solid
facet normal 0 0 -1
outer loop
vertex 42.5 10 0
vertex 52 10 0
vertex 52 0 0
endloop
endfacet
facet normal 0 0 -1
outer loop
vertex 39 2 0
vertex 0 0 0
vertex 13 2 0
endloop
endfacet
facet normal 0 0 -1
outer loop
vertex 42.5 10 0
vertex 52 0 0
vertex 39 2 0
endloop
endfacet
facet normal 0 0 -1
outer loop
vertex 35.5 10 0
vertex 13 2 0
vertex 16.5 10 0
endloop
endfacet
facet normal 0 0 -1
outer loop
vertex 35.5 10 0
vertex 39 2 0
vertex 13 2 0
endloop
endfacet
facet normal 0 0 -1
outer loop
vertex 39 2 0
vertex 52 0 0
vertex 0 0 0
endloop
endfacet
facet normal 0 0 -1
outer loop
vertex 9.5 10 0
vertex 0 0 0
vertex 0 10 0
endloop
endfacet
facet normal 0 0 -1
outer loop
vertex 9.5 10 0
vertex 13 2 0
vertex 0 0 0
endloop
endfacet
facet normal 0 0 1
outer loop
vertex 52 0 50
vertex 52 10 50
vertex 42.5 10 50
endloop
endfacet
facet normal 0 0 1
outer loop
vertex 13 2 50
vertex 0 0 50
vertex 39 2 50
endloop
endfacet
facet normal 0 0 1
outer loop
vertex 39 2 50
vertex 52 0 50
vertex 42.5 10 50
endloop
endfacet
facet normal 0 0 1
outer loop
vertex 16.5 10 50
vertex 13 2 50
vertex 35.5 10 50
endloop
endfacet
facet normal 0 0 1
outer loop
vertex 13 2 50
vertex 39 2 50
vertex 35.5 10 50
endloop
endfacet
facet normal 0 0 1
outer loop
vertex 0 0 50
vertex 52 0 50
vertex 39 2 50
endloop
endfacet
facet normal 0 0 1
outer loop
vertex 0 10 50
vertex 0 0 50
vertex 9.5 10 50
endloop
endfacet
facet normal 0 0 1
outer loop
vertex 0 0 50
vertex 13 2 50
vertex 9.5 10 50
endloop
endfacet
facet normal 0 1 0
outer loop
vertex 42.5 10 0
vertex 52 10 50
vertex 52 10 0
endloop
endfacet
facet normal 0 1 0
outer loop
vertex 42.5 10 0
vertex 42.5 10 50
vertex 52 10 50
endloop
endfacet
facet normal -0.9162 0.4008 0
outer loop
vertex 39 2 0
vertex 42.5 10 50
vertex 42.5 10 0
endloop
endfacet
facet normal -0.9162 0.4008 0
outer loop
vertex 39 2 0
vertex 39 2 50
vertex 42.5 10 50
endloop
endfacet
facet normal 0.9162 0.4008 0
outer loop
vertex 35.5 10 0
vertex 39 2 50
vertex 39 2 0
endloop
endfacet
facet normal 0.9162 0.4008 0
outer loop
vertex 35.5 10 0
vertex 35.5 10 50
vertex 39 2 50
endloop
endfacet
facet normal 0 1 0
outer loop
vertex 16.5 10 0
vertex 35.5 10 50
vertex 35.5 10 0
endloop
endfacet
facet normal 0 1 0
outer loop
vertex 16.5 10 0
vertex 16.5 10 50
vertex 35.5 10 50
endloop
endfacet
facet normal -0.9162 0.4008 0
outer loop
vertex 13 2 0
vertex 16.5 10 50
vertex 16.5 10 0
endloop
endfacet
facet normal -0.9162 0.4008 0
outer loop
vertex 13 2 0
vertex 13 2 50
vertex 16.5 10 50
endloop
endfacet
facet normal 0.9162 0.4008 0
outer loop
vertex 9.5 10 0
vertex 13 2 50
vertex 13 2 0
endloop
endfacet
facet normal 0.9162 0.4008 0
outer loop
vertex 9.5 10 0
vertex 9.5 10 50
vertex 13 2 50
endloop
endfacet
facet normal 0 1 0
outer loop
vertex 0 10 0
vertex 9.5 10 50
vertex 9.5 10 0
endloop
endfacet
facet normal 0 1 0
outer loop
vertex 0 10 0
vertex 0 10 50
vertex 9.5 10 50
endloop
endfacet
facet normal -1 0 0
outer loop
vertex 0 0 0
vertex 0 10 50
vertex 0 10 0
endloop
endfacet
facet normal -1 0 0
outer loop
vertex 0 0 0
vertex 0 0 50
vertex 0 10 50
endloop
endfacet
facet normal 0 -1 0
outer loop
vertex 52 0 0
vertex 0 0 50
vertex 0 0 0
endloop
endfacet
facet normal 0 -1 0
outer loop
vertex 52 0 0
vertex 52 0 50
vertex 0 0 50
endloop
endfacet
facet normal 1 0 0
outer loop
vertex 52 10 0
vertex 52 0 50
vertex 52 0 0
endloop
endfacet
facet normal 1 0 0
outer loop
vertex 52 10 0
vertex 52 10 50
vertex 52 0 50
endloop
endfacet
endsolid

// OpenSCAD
$fn = 32;

// ----------------------------------------------------------------------
// V guide rail: doublev, 52 mm wide
// ----------------------------------------------------------------------

// --- parameters (mm) ---
rail_w = 52;              // rail width, X
base_t = 10;              // base plate thickness
v_depth = 8;              // V feature depth / height
v_half_w = 7;             // half width of the V at the base face
plate_t = 50;             // rail length, Z (the extrusion height)
groove_off = 13;          // offset of each groove from the centreline
fit_tol = 0.1;            // declared fit tolerance (prompt contract)
free_tol = 0.5;           // declared free tolerance (prompt contract)

centre_x = rail_w / 2;  // rail centreline
groove_a = centre_x - groove_off;  // axis of the first groove
groove_b = centre_x + groove_off;  // axis of the second groove

profile = [[0, 0], [52, 0], [52, 10], [42.5, 10], [39, 2], [35.5, 10], [16.5, 10], [13, 2], [9.5, 10], [0, 10]];  // primary outline, 10 points, counter clockwise

// --- the one profile operation ---
linear_extrude(height = plate_t) polygon(points = profile);
